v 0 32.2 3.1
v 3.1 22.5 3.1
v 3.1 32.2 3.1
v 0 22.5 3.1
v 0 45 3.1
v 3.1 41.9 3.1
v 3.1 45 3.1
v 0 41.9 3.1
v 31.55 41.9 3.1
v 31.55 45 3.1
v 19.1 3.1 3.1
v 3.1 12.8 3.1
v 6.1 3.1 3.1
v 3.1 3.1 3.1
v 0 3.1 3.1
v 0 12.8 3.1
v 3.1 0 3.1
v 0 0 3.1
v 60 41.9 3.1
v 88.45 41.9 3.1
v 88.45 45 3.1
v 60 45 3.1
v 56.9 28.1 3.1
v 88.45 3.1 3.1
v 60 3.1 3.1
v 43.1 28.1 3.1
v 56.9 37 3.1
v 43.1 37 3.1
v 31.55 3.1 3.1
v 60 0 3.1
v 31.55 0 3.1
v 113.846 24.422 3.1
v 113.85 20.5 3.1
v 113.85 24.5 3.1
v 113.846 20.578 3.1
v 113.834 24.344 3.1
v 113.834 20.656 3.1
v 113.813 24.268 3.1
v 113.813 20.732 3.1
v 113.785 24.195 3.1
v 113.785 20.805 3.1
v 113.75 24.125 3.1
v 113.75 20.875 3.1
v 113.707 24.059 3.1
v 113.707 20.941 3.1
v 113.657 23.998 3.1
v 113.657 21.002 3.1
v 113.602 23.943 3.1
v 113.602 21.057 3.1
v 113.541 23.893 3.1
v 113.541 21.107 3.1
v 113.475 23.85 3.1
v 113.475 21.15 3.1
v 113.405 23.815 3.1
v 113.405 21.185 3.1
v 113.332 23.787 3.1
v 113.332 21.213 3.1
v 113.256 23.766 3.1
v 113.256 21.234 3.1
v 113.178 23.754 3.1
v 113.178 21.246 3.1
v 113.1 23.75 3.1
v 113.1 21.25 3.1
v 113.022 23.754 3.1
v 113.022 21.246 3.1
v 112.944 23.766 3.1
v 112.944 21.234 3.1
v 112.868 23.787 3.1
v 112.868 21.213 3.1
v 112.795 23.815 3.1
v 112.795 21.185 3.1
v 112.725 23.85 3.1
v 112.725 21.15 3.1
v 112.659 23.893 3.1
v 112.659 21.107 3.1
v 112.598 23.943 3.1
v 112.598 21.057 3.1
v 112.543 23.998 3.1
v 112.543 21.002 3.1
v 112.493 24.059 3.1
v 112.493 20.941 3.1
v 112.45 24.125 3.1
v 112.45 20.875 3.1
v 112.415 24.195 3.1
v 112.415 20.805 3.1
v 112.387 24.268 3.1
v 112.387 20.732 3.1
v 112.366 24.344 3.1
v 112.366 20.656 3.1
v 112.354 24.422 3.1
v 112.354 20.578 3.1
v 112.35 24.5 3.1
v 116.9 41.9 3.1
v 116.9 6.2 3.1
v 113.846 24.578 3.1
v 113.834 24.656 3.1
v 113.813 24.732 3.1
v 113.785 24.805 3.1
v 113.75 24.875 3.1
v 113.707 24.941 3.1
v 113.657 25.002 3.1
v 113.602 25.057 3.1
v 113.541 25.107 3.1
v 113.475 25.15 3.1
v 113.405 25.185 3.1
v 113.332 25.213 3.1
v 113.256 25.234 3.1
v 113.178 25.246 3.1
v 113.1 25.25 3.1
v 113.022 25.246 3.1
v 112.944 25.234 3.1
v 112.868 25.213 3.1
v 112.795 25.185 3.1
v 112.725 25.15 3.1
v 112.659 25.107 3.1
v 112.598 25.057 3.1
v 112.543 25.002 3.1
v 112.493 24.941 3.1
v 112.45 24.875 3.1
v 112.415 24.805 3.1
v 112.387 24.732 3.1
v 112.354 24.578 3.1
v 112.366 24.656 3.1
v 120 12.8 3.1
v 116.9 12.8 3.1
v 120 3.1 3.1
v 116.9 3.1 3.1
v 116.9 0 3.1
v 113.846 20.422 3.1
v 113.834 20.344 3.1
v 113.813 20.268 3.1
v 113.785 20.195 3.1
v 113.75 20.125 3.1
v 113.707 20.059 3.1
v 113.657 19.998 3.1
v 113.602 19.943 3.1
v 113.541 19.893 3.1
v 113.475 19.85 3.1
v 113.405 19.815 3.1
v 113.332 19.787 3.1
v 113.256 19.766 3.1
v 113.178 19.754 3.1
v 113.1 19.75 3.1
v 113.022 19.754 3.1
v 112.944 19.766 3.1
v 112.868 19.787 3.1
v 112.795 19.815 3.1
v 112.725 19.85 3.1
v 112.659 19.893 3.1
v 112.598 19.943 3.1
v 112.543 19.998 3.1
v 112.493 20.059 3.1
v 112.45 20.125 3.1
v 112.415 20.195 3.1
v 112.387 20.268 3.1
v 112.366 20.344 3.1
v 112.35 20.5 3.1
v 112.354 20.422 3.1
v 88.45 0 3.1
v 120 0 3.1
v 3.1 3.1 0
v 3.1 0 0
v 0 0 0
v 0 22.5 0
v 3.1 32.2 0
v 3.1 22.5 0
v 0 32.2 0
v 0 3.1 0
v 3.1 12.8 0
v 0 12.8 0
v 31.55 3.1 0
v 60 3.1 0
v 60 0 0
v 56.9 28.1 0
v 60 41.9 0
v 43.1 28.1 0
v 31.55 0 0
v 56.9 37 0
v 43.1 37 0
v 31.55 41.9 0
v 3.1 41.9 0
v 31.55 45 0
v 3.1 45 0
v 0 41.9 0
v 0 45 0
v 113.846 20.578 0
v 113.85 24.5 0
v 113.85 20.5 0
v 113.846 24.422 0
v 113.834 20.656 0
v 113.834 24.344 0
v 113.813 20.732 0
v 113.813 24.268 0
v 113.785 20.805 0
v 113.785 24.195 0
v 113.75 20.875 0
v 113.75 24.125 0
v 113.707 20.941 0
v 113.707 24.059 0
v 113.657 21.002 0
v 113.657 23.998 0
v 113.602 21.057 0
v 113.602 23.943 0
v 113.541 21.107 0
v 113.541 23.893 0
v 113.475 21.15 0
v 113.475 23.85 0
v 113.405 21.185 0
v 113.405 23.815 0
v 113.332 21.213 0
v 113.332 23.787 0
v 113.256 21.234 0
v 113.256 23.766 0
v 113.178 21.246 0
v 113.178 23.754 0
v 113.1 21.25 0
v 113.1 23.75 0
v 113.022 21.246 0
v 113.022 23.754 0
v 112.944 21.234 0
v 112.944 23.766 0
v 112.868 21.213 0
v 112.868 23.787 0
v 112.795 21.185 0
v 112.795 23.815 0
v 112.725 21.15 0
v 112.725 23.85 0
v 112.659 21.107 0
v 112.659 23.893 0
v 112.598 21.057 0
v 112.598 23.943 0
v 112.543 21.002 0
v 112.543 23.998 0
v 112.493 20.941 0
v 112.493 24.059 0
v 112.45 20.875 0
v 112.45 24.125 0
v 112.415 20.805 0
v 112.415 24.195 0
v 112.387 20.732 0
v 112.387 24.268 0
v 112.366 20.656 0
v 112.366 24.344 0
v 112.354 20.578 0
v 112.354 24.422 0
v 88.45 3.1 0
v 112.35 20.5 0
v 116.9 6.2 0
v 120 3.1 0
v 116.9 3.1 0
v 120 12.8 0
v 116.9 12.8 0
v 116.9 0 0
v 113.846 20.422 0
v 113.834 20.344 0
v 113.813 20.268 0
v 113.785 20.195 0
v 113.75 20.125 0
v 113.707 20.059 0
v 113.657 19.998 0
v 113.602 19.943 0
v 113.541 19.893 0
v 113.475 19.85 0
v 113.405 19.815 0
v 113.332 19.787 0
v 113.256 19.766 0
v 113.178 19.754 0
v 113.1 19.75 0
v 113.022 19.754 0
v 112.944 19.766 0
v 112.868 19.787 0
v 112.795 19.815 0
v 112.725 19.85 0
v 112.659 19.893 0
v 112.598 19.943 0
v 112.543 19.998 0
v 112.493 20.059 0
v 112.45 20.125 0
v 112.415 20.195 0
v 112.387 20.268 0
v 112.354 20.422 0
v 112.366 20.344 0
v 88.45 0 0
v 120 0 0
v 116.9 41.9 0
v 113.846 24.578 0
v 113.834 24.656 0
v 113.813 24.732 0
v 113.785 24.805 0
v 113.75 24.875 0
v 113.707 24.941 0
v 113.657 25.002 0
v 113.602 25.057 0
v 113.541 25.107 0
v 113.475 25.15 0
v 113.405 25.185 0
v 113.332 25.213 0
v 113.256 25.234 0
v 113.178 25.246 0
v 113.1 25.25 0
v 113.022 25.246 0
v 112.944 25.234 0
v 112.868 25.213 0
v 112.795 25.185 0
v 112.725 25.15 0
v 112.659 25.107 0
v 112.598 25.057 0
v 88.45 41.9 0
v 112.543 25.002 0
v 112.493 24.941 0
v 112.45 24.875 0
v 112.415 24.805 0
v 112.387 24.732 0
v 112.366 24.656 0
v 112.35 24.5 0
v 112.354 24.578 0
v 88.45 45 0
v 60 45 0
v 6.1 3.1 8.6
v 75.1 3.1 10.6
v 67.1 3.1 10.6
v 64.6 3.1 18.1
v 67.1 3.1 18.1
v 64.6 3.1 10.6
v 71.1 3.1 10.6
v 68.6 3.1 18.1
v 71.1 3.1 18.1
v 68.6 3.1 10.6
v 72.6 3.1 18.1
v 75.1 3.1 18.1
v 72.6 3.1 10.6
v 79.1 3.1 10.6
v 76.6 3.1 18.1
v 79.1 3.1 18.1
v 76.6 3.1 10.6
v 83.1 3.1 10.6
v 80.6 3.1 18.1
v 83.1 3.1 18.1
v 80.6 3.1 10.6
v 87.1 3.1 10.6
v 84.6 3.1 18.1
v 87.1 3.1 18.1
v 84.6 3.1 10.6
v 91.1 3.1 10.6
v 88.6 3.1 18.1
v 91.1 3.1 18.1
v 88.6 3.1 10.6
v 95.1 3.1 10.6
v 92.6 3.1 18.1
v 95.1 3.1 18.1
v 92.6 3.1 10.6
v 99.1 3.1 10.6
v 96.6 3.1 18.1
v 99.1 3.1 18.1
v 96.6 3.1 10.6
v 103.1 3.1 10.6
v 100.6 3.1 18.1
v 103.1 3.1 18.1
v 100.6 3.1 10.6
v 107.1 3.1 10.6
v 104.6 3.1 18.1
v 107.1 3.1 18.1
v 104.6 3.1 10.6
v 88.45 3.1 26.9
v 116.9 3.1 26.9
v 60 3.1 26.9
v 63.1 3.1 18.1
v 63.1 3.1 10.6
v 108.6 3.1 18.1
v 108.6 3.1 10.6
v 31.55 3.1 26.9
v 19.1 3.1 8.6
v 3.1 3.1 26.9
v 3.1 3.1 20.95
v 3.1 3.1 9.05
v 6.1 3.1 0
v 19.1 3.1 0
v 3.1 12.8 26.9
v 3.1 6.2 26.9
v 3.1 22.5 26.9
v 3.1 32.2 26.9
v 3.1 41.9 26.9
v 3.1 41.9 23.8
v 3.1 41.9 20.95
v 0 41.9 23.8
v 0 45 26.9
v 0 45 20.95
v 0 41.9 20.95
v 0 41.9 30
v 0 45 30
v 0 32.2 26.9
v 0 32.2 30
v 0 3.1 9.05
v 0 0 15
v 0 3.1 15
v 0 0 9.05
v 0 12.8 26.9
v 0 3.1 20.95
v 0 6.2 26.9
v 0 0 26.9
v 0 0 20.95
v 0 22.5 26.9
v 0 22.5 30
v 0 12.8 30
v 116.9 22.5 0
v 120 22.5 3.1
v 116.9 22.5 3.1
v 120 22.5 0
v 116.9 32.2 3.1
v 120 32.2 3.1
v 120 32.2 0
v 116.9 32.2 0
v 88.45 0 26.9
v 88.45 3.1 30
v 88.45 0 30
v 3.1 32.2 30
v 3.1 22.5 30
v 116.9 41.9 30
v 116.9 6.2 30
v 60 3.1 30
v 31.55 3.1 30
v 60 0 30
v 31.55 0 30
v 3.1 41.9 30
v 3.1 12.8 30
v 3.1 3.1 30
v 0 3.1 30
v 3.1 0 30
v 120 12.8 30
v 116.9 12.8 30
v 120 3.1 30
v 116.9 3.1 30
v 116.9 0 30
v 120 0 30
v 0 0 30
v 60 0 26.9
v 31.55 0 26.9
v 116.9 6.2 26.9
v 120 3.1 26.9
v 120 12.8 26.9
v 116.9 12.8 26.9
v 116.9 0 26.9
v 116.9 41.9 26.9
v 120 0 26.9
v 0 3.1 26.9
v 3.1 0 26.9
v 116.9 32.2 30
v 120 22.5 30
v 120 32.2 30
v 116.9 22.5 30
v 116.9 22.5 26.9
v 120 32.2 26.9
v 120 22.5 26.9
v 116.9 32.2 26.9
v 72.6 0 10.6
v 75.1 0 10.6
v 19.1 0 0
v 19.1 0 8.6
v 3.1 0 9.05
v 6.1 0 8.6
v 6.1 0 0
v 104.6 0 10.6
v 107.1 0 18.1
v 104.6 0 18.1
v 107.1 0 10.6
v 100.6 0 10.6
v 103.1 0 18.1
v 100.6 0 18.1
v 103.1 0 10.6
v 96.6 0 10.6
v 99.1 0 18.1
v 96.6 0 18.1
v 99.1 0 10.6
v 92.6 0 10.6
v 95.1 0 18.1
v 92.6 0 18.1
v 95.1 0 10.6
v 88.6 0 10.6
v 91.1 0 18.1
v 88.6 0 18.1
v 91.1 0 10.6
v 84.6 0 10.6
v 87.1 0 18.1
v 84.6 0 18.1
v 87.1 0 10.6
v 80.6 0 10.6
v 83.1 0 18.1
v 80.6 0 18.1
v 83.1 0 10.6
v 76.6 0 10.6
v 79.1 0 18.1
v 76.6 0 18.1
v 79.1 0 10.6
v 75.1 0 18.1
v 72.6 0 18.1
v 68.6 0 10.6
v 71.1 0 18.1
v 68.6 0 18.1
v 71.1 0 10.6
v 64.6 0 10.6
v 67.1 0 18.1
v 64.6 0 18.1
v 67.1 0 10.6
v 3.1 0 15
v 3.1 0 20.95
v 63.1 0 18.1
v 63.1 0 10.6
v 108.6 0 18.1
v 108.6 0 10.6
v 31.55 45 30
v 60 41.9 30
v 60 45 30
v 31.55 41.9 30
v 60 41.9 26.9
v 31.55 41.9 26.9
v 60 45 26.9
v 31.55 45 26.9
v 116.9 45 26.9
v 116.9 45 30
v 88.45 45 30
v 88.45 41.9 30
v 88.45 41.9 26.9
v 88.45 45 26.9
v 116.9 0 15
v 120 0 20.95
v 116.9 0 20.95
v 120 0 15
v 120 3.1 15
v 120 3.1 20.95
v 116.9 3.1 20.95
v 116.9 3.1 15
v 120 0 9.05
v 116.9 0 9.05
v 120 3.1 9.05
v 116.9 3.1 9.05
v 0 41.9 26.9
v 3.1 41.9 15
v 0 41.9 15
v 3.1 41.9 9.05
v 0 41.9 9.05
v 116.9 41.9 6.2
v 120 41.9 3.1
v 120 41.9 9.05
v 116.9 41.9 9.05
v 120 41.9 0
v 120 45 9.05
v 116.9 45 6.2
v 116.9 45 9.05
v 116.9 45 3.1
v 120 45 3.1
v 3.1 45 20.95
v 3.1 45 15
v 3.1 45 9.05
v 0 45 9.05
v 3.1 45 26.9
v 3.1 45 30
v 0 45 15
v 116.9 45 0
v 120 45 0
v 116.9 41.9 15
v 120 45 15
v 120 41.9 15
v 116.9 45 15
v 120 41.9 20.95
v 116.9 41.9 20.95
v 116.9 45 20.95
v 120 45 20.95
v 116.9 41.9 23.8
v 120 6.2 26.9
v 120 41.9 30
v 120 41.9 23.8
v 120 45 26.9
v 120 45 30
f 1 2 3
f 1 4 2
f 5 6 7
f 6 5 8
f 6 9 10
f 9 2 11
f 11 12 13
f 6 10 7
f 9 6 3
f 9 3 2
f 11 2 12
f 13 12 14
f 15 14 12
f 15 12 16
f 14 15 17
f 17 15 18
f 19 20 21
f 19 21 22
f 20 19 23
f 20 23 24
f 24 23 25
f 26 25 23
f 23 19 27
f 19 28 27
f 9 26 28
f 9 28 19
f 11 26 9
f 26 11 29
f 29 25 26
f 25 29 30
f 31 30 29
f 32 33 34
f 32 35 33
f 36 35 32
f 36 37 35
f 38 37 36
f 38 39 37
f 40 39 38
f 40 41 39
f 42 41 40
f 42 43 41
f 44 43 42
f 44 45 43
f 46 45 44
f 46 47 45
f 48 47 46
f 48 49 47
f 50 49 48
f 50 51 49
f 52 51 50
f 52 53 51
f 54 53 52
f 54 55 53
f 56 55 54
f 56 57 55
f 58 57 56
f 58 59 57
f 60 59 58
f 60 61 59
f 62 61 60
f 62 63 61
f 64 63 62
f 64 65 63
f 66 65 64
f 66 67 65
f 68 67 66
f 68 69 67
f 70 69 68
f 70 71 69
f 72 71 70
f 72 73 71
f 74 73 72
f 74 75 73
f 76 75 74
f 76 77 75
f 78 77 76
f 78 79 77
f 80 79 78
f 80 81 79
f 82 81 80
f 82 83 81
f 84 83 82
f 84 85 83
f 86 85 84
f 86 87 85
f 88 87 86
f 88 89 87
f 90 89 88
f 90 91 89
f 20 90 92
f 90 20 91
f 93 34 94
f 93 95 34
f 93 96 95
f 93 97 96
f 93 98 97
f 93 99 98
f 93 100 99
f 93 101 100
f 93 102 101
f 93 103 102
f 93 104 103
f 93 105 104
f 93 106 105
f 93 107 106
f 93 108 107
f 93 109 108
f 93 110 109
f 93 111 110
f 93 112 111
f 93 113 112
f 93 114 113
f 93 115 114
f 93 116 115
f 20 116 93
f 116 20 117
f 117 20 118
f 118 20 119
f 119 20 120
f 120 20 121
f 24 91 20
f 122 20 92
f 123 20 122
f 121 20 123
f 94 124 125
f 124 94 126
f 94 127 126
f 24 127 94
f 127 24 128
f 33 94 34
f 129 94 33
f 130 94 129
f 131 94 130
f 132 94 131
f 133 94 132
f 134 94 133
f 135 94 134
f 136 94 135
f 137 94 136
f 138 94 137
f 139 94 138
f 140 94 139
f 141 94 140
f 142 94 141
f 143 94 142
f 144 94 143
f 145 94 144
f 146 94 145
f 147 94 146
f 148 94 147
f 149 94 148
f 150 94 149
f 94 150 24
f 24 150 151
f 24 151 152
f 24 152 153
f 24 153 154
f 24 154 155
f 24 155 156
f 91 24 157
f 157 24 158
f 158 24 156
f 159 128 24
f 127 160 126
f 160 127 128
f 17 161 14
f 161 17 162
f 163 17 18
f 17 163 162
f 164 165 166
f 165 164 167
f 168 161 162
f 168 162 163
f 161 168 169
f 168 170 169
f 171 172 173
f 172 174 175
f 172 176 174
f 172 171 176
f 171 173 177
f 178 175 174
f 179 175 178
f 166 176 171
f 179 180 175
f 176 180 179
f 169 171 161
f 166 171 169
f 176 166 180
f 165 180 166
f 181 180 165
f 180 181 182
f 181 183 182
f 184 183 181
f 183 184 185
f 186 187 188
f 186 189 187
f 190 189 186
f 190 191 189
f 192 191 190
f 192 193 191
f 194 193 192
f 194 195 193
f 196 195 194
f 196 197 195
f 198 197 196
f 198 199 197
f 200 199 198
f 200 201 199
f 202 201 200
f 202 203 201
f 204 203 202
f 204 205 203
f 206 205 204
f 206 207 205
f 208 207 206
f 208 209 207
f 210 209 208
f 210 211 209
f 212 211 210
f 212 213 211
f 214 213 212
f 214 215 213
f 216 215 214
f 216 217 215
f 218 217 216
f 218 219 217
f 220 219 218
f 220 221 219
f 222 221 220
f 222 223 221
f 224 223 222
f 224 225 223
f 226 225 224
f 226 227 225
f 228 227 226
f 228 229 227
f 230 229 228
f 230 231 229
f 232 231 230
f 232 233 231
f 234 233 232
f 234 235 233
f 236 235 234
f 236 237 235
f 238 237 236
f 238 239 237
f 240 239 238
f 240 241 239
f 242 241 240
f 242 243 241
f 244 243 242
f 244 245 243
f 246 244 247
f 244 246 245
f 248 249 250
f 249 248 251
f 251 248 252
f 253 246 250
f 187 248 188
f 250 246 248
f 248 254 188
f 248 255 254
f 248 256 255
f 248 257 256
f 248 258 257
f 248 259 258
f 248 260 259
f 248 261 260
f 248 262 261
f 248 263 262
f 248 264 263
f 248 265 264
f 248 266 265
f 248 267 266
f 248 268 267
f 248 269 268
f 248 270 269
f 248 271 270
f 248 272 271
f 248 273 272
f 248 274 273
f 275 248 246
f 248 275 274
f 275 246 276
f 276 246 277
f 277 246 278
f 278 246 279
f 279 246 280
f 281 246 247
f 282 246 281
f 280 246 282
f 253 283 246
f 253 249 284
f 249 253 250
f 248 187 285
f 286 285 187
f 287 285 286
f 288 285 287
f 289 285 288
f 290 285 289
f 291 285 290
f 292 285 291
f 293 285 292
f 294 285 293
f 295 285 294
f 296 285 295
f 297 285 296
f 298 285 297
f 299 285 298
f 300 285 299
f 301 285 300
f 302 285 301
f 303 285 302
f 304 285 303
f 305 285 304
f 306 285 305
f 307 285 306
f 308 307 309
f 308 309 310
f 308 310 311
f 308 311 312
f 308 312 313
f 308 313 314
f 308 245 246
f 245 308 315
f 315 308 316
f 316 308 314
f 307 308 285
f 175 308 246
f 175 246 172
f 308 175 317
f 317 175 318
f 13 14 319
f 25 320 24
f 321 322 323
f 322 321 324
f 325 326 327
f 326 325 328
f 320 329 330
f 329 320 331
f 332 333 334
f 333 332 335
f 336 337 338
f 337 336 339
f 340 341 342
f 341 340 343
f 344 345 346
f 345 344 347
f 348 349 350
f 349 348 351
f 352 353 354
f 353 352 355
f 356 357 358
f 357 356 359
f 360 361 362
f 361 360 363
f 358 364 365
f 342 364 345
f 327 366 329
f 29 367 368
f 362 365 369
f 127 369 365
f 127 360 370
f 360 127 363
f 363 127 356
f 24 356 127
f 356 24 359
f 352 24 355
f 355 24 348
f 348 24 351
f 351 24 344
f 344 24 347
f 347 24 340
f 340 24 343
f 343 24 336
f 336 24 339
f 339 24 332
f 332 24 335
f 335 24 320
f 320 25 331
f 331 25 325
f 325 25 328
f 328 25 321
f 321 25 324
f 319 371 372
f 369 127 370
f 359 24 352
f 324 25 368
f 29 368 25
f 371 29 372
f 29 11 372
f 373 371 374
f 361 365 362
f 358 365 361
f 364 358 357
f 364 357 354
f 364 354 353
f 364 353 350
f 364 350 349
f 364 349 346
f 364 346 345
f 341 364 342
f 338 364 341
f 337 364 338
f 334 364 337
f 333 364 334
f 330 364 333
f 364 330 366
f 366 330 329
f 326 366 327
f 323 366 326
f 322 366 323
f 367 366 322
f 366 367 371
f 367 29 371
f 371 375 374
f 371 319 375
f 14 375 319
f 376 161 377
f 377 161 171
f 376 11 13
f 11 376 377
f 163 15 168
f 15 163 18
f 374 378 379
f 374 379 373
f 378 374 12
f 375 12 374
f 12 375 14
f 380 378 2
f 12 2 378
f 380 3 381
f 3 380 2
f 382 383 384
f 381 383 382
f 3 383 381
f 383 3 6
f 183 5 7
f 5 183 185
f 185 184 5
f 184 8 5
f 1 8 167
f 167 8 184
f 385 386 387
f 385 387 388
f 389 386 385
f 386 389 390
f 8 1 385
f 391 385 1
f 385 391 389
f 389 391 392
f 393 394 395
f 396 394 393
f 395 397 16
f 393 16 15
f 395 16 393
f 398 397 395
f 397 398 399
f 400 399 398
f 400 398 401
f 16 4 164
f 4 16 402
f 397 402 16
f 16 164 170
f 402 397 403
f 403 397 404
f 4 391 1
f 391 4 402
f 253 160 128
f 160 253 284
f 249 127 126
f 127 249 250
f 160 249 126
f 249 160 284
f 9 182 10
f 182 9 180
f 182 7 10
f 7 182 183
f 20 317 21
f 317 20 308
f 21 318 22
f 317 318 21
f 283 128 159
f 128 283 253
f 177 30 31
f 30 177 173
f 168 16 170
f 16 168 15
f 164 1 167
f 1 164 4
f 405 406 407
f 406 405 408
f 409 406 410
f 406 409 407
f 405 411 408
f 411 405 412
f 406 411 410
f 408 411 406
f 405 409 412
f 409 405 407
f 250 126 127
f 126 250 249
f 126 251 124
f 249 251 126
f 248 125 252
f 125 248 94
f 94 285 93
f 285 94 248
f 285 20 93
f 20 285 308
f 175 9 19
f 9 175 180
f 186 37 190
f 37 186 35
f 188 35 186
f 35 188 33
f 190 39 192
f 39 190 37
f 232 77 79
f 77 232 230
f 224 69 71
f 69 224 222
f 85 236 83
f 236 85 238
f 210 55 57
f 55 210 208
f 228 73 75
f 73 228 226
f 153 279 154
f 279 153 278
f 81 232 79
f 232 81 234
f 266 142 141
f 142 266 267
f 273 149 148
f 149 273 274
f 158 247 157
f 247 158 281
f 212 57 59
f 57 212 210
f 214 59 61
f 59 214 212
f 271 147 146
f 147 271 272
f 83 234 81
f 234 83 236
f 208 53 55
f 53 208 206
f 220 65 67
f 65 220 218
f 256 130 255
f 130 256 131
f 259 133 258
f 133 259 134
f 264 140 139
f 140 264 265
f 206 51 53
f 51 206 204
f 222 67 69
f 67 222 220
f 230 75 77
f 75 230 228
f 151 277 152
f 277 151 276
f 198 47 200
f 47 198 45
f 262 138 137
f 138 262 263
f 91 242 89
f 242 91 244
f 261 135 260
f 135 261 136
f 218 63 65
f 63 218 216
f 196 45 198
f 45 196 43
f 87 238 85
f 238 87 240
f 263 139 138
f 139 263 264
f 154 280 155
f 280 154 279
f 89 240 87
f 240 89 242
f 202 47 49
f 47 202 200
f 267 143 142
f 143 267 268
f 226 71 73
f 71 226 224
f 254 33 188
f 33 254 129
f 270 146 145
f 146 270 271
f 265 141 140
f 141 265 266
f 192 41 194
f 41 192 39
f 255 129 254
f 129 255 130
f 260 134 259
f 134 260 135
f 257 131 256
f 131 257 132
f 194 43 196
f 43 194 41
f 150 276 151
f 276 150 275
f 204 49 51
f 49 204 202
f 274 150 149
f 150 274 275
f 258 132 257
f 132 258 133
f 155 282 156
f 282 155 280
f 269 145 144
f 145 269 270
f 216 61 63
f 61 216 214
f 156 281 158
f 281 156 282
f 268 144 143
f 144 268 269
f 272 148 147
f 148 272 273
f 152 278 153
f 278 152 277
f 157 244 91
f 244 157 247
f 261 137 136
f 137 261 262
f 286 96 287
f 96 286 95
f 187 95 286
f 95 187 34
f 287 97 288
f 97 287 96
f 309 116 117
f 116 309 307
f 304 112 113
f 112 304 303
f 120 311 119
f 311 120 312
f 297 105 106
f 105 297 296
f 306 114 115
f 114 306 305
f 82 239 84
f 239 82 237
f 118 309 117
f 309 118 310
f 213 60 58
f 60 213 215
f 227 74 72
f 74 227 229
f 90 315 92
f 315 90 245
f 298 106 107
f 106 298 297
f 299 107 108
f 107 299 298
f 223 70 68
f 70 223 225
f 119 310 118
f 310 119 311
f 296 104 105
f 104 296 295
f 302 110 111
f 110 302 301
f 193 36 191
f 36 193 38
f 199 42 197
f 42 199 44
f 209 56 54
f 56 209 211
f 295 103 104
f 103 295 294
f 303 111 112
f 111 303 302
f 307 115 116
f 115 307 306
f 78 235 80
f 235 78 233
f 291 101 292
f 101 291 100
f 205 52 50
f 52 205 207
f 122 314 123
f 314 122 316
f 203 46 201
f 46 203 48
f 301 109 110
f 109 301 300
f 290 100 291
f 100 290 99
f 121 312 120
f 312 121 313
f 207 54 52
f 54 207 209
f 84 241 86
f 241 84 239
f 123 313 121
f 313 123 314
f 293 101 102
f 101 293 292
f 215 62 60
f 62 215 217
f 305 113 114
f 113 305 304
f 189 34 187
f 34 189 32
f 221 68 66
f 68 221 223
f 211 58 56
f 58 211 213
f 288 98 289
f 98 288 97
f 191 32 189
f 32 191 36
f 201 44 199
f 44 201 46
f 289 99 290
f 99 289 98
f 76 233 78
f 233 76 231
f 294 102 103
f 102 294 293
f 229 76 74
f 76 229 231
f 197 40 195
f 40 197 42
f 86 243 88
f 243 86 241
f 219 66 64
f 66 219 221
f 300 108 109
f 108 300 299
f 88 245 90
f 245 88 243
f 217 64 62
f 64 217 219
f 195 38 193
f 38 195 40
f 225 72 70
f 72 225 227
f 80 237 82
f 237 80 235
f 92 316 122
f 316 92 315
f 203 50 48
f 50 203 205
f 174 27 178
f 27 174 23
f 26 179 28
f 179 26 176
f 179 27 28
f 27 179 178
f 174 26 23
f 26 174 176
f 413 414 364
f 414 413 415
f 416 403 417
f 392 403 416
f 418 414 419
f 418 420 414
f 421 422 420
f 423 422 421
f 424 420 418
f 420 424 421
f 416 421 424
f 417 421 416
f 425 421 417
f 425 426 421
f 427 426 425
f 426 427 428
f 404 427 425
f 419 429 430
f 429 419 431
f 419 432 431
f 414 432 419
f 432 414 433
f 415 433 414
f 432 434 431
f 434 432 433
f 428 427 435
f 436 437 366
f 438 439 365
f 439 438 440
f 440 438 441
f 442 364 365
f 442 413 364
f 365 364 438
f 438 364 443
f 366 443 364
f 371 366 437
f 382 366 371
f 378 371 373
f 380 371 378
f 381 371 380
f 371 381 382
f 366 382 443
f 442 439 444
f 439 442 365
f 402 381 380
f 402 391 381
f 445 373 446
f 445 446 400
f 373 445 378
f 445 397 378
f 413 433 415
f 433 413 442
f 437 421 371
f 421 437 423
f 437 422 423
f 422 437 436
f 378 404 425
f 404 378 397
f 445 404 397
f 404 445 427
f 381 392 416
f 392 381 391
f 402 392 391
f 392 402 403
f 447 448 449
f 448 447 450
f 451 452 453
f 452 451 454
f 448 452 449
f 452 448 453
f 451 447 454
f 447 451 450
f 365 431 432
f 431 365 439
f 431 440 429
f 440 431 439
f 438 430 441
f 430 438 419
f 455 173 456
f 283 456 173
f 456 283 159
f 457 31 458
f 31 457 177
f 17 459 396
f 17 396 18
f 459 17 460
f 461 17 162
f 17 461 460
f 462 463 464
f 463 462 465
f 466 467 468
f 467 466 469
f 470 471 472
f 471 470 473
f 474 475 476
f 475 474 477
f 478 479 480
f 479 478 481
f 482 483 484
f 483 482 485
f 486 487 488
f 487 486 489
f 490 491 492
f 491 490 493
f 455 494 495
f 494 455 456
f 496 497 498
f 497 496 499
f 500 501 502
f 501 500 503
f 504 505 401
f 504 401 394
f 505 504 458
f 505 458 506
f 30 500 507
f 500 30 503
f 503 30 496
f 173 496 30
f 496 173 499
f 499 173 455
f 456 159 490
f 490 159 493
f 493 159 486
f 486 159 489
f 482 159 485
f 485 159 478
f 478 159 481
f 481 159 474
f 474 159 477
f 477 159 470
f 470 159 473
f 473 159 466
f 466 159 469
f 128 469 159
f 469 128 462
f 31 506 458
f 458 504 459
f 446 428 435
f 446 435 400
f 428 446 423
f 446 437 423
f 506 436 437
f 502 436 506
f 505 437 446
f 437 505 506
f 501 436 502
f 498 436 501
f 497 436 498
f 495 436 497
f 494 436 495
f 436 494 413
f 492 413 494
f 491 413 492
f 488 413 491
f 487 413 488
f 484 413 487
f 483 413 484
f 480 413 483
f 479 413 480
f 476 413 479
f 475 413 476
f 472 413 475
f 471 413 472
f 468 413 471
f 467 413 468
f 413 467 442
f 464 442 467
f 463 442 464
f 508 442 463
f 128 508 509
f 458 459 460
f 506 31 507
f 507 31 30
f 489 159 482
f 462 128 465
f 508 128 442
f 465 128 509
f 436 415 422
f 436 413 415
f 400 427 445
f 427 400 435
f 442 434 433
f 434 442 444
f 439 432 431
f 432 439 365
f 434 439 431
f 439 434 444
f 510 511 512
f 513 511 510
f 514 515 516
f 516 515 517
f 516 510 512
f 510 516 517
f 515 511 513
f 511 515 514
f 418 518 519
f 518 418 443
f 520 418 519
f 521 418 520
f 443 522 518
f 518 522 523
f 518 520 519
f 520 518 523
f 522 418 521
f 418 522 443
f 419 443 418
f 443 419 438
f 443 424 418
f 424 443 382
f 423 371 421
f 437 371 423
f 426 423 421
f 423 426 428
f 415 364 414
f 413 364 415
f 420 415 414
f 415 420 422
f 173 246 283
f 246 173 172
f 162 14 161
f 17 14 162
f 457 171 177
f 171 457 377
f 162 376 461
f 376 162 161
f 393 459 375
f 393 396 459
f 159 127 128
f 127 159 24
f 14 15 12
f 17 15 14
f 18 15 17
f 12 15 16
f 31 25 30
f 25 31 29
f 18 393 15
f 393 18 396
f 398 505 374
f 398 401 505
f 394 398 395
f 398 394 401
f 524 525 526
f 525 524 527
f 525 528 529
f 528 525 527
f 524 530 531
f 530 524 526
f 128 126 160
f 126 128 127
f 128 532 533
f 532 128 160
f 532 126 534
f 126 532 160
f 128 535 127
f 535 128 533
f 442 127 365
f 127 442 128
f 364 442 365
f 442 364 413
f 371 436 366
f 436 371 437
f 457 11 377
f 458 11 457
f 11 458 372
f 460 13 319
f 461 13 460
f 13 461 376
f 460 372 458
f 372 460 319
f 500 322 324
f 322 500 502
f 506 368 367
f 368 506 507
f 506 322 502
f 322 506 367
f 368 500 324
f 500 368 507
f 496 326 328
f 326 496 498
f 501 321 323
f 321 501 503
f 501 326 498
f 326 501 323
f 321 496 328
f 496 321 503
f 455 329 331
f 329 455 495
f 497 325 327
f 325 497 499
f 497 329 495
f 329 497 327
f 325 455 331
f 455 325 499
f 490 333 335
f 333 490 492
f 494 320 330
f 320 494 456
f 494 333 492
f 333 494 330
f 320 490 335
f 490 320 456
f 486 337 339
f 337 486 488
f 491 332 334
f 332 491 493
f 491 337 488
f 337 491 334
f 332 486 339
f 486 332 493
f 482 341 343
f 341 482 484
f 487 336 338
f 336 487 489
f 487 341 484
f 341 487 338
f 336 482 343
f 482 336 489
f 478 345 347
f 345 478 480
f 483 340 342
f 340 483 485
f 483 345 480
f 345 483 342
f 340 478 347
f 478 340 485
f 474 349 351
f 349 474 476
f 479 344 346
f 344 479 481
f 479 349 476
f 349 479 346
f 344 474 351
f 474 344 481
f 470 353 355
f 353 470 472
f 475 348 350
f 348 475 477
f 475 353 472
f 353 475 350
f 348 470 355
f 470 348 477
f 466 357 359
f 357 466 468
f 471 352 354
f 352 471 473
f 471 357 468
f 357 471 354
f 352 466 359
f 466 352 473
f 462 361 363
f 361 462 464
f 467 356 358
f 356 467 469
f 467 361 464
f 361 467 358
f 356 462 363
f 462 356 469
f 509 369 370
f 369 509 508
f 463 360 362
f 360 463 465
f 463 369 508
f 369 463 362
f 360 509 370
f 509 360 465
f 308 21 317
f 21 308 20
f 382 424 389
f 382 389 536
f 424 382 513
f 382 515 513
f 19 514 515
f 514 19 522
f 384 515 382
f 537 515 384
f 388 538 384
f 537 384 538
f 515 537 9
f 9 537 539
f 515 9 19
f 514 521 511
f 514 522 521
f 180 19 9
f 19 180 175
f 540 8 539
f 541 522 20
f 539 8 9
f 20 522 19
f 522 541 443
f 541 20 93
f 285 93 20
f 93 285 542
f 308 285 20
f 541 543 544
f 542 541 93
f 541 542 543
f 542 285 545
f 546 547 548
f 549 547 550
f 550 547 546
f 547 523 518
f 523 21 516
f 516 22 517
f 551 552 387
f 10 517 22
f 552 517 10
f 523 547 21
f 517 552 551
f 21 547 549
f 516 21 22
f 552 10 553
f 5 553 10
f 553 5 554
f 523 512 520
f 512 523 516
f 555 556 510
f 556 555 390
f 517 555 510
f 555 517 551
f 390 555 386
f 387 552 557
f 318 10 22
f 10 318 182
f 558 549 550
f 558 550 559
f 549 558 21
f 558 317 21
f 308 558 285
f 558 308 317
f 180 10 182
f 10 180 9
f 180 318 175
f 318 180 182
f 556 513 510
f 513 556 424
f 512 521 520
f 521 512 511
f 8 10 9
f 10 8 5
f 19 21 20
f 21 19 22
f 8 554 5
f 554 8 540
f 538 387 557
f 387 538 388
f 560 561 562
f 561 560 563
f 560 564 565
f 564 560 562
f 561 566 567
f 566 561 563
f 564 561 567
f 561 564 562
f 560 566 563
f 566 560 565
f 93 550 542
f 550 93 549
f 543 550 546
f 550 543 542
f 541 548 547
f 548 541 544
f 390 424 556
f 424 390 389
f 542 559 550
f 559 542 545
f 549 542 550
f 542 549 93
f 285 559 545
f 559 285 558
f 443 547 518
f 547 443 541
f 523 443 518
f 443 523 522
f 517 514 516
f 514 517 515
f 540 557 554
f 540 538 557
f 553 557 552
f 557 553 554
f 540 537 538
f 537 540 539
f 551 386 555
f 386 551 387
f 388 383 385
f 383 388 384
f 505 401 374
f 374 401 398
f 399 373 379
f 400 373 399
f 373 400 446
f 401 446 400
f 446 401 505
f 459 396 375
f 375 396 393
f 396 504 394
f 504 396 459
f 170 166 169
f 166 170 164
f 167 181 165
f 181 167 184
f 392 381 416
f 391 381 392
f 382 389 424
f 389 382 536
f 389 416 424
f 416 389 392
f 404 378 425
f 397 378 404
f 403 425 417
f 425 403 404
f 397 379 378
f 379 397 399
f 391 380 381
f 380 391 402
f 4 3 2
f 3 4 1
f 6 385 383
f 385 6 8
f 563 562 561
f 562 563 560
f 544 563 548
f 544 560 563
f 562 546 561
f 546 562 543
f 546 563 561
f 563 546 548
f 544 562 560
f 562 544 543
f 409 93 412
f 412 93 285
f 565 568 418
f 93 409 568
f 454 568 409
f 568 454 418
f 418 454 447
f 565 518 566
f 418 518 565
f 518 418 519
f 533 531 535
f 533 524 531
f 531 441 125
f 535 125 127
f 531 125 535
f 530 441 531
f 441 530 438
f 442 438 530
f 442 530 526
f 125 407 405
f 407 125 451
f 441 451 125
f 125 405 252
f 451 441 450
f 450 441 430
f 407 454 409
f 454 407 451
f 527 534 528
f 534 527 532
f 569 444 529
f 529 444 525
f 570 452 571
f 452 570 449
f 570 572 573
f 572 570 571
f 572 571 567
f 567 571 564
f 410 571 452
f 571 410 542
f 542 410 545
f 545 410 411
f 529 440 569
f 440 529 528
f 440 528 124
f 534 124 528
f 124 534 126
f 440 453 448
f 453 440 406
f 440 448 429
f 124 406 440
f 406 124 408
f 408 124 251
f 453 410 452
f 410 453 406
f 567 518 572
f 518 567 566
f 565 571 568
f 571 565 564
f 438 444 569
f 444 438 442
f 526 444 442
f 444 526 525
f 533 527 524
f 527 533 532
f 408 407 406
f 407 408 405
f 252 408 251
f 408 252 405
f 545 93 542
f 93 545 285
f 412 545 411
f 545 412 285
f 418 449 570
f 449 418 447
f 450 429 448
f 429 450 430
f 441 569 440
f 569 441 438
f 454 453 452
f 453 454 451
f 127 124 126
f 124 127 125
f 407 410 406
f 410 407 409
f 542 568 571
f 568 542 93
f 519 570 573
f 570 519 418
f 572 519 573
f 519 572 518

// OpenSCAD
include <lasercut.scad>; 

$fn = 60;

thickness = 3.1;
x = 120;
y = 45;
z = 30;

r_hole = 0.75;
dist_hole = 4;
height_hole = z/4;

cutouts_air = [for (xi = [0:4:x/2 - 15]) [xi + x/2, z/2-height_hole, 1.5, height_hole]];

color("Gold",0.75)
lasercutoutBox(thickness = thickness, x=x, y=y, z=z,
    sides=6, num_fingers=2,
    cutouts_a = [
            [[40, 25, 13.8, 8.9]],  // rocker
            [],
            concat([[3, -3.5, 13, 9]], cutouts_air),
            [],
            []
        ],
    circles_remove_a = [
            [[r_hole, x - 10, y/2 - dist_hole/2 - thickness],
            [r_hole, x - 10, y/2 + dist_hole/2 - thickness]],
        ]
);
